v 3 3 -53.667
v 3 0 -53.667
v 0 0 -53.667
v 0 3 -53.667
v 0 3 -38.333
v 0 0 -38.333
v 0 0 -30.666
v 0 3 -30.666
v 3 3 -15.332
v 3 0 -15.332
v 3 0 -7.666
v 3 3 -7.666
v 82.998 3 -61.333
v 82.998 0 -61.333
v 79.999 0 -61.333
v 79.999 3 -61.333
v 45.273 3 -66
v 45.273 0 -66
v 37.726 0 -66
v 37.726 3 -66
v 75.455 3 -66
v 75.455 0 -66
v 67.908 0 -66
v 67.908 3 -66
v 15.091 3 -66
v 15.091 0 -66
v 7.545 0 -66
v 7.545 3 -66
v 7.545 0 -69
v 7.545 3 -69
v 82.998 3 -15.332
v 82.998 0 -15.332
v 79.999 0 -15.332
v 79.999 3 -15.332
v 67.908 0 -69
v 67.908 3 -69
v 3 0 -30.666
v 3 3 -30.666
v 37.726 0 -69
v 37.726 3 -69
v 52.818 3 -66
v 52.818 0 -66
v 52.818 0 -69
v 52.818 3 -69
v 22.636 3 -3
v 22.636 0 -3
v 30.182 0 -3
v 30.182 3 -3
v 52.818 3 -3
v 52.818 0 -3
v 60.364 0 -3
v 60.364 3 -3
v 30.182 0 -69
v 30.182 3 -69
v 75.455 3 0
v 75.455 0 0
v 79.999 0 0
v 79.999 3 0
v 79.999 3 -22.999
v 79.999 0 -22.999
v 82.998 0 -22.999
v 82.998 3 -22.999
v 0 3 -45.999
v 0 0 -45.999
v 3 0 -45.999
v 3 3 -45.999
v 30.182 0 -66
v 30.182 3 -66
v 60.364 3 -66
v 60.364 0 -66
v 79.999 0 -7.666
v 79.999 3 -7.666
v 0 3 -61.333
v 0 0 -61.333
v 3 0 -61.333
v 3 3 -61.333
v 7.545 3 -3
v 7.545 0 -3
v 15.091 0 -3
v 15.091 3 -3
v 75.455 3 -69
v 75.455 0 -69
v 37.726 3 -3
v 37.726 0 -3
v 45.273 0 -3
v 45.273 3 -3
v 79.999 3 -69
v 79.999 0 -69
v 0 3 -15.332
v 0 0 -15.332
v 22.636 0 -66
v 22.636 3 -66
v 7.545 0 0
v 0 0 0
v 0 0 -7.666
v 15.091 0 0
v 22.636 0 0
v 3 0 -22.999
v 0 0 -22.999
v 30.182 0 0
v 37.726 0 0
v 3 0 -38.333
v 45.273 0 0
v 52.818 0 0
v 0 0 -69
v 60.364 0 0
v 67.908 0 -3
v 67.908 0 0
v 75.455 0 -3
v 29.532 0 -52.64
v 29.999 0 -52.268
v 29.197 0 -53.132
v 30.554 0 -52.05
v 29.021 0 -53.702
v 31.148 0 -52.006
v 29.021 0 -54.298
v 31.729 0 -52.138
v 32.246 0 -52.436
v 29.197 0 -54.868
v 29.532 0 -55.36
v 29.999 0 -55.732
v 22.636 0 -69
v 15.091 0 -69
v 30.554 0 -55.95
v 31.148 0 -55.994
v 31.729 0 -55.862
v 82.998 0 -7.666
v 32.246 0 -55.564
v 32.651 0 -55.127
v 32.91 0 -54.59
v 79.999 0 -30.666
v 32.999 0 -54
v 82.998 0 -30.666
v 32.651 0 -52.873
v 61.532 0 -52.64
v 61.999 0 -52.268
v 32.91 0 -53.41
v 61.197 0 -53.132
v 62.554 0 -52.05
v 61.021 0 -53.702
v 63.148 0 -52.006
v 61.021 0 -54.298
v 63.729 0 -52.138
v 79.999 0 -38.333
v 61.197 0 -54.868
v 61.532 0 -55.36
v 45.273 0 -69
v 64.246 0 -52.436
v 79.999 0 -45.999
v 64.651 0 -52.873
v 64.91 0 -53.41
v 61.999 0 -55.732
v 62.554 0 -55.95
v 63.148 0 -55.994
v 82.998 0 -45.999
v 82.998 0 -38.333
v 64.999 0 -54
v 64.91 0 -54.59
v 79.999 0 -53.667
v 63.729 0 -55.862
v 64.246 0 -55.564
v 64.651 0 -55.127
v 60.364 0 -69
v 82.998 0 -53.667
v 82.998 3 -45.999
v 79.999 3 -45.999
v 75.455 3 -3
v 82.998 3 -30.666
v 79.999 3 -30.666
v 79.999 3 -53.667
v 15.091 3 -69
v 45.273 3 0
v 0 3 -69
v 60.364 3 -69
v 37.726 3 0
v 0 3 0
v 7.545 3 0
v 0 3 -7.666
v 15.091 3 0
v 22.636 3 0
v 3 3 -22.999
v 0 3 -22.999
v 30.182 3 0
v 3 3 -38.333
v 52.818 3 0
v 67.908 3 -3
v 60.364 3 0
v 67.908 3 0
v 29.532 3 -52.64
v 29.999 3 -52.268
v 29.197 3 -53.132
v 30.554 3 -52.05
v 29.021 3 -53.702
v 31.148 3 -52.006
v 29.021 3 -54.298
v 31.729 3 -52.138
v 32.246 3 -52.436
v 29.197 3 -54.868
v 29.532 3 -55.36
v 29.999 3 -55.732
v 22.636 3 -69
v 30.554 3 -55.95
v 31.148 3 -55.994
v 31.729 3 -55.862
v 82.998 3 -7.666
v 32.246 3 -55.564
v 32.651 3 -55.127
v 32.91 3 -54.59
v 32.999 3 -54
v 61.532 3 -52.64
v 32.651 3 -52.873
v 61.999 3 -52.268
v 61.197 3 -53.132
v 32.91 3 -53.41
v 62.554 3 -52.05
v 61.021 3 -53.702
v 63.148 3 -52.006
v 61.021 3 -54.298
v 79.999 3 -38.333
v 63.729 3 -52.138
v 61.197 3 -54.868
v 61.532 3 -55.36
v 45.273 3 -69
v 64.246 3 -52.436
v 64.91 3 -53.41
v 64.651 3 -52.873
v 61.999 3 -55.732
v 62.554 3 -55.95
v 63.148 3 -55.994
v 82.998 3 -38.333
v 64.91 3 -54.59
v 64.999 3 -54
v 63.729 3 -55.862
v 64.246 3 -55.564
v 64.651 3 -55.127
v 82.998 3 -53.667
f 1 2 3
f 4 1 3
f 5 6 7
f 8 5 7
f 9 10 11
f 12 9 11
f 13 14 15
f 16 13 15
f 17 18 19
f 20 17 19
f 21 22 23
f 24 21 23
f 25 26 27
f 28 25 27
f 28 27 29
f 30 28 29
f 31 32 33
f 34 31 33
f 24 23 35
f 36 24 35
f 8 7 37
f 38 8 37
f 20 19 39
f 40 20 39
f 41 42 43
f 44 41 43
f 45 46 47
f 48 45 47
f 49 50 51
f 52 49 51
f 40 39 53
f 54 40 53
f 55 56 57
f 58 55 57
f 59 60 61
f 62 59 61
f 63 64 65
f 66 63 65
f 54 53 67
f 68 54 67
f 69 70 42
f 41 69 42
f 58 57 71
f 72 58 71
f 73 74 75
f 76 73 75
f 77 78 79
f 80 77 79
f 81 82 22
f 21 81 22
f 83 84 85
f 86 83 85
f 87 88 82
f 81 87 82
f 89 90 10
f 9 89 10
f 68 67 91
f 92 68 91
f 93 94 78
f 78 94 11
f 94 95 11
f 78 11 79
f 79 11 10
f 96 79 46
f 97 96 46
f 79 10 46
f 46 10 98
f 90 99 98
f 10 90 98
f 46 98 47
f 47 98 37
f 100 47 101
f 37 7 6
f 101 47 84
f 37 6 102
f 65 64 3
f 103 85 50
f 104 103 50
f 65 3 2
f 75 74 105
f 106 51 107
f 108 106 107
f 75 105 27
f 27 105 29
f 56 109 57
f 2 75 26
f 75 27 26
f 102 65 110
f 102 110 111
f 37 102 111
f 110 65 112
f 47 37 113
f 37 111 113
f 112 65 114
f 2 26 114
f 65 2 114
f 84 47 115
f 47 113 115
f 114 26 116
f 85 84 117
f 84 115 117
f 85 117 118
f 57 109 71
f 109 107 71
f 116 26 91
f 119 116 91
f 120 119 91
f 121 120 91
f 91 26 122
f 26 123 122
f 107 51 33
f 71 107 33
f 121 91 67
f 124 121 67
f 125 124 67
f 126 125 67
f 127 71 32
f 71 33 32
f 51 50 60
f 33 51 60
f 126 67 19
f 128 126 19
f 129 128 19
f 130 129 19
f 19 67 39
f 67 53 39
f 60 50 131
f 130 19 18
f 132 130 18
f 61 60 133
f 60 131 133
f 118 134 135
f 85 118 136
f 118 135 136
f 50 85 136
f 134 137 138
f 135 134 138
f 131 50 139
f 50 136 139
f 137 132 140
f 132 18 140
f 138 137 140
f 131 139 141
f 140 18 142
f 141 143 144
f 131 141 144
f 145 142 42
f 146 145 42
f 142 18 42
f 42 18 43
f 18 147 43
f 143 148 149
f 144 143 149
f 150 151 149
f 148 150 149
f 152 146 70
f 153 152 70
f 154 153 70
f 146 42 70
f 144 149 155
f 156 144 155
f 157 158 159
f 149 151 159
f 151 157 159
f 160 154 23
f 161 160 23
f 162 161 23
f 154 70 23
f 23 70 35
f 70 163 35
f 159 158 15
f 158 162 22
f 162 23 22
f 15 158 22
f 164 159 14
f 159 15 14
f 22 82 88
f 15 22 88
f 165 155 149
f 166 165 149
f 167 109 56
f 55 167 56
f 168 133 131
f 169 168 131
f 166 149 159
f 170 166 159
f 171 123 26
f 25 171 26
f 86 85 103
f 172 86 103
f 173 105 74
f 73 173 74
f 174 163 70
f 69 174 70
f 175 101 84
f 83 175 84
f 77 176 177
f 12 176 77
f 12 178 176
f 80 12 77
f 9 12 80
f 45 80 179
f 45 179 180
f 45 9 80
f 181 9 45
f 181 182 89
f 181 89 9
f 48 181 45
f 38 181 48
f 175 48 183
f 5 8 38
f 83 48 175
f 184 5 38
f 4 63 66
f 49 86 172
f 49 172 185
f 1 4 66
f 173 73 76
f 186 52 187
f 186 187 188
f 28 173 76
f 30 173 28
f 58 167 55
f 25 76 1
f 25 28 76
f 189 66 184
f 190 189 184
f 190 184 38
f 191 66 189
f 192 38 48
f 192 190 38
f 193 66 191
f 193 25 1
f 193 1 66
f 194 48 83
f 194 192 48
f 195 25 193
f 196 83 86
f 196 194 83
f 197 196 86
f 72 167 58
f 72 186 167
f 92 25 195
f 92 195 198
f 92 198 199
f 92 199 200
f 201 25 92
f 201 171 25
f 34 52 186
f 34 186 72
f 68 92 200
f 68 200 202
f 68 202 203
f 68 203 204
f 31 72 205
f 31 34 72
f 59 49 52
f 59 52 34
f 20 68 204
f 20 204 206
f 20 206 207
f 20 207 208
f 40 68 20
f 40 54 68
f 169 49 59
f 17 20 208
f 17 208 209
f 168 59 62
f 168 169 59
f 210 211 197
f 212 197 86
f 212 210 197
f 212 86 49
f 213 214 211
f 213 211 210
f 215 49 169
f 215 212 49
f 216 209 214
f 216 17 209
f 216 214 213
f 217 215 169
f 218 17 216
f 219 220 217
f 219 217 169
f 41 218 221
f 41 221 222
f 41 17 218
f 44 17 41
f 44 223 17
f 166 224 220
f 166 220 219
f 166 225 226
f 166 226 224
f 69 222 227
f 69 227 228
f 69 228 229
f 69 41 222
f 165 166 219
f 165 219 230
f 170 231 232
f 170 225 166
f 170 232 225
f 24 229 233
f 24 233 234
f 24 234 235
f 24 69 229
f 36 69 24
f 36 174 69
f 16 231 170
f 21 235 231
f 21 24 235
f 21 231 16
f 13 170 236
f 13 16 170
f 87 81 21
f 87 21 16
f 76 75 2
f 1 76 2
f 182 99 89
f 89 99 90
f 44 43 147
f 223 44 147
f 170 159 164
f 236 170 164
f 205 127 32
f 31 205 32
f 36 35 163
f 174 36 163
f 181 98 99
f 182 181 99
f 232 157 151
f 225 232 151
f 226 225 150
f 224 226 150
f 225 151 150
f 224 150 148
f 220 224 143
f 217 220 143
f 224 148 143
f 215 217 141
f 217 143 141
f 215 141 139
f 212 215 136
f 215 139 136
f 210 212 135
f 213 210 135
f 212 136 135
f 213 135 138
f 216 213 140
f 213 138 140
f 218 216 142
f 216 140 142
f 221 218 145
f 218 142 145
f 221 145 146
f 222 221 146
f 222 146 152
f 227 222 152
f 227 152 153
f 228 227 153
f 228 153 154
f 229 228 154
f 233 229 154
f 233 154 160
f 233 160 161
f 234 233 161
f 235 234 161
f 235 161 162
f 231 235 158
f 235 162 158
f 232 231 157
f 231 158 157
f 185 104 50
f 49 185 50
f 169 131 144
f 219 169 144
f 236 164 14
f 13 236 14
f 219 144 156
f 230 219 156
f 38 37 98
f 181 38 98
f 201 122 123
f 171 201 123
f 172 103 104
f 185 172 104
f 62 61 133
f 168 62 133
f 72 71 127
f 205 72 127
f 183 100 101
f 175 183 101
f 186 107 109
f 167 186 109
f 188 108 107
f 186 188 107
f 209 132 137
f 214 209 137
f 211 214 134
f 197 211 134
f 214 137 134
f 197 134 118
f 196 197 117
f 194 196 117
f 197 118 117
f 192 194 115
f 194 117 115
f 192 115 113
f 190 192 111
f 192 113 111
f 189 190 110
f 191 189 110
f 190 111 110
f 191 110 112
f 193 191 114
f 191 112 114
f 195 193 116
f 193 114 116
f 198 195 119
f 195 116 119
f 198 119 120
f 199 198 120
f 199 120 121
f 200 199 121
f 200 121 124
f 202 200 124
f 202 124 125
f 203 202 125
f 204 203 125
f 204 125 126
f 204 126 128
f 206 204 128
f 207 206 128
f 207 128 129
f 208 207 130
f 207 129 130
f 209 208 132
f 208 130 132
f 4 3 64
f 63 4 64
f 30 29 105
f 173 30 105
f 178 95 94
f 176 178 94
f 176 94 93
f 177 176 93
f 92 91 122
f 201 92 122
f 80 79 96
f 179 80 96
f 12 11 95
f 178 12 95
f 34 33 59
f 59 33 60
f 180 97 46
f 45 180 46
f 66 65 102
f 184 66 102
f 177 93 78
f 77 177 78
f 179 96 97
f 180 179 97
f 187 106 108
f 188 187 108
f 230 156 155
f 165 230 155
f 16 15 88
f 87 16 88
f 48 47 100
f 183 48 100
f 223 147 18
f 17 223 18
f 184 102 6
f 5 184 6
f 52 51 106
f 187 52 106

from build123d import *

# Parameters (mm, degrees)
AUFSATZ_LINEAR_AUSTRAGEN1_DEPTH = 3
SKIZZE2_R                       = 2
SCHNITT_LINEAR_AUSTRAGEN1_DEPTH = 3


with BuildPart() as part:
    # Skizze1 → Aufsatz-Linear austragen1 (new body)
    with BuildSketch(Plane(origin=(0, 0, 0), x_dir=(1, 0, 0), z_dir=(0, 1, 0))):
        Polygon((0, 0.000138), (7.544562, 0.000138), (7.544562, 3.000132), (15.090902, 3.000132), (15.090902, 0.000138), (22.635718, 0.000138), (22.635718, 3.000132), (30.18155, 3.000132), (30.18155, 0.000138), (37.726366, 0.000138), (37.726366, 3.000132), (45.272706, 3.000132), (45.272706, 0.000138), (52.81803, 0.000138), (52.81803, 3.000132), (60.36437, 3.000132), (60.36437, 0.000138), (67.90817, 0.000138), (67.90817, 3.000132), (75.45451, 3.000132), (75.45451, 0.000138), (79.99857, 0.000138), (79.99857, 7.666366), (82.99831, 7.666366), (82.99831, 15.332086), (79.99857, 15.332086), (79.99857, 22.99933), (82.99831, 22.99933), (82.99831, 30.665558), (79.99857, 30.665558), (79.99857, 38.333056), (82.99831, 38.333056), (82.99831, 45.99903), (79.99857, 45.99903), (79.99857, 53.666528), (82.99831, 53.666528), (82.99831, 61.332502), (79.99857, 61.332502), (79.99857, 69), (75.45451, 69), (75.45451, 66.000006), (67.90817, 66.000006), (67.90817, 69), (60.36437, 69), (60.36437, 66.000006), (52.81803, 66.000006), (52.81803, 69), (45.272706, 69), (45.272706, 66.000006), (37.726366, 66.000006), (37.726366, 69), (30.18155, 69), (30.18155, 66.000006), (22.635718, 66.000006), (22.635718, 69), (15.090902, 69), (15.090902, 66.000006), (7.544562, 66.000006), (7.544562, 69), (0, 69), (0, 61.332502), (2.99974, 61.332502), (2.99974, 53.666528), (0, 53.666528), (0, 45.99903), (2.99974, 45.99903), (2.99974, 38.333056), (0, 38.333056), (0, 30.665558), (2.99974, 30.665558), (2.99974, 22.99933), (0, 22.99933), (0, 15.332086), (2.99974, 15.332086), (2.99974, 7.666366), (0, 7.666366), align=None)
    extrude(amount=AUFSATZ_LINEAR_AUSTRAGEN1_DEPTH)

    # Skizze2 → Schnitt-Linear austragen1 (cut)
    with BuildSketch(Plane.XZ):
        with Locations((62.99857, -54.000006)):
            Circle(SKIZZE2_R)
        with Locations((30.99857, -54.000006)):
            Circle(SKIZZE2_R)
    extrude(amount=-SCHNITT_LINEAR_AUSTRAGEN1_DEPTH, mode=Mode.SUBTRACT)


solid = part.part
